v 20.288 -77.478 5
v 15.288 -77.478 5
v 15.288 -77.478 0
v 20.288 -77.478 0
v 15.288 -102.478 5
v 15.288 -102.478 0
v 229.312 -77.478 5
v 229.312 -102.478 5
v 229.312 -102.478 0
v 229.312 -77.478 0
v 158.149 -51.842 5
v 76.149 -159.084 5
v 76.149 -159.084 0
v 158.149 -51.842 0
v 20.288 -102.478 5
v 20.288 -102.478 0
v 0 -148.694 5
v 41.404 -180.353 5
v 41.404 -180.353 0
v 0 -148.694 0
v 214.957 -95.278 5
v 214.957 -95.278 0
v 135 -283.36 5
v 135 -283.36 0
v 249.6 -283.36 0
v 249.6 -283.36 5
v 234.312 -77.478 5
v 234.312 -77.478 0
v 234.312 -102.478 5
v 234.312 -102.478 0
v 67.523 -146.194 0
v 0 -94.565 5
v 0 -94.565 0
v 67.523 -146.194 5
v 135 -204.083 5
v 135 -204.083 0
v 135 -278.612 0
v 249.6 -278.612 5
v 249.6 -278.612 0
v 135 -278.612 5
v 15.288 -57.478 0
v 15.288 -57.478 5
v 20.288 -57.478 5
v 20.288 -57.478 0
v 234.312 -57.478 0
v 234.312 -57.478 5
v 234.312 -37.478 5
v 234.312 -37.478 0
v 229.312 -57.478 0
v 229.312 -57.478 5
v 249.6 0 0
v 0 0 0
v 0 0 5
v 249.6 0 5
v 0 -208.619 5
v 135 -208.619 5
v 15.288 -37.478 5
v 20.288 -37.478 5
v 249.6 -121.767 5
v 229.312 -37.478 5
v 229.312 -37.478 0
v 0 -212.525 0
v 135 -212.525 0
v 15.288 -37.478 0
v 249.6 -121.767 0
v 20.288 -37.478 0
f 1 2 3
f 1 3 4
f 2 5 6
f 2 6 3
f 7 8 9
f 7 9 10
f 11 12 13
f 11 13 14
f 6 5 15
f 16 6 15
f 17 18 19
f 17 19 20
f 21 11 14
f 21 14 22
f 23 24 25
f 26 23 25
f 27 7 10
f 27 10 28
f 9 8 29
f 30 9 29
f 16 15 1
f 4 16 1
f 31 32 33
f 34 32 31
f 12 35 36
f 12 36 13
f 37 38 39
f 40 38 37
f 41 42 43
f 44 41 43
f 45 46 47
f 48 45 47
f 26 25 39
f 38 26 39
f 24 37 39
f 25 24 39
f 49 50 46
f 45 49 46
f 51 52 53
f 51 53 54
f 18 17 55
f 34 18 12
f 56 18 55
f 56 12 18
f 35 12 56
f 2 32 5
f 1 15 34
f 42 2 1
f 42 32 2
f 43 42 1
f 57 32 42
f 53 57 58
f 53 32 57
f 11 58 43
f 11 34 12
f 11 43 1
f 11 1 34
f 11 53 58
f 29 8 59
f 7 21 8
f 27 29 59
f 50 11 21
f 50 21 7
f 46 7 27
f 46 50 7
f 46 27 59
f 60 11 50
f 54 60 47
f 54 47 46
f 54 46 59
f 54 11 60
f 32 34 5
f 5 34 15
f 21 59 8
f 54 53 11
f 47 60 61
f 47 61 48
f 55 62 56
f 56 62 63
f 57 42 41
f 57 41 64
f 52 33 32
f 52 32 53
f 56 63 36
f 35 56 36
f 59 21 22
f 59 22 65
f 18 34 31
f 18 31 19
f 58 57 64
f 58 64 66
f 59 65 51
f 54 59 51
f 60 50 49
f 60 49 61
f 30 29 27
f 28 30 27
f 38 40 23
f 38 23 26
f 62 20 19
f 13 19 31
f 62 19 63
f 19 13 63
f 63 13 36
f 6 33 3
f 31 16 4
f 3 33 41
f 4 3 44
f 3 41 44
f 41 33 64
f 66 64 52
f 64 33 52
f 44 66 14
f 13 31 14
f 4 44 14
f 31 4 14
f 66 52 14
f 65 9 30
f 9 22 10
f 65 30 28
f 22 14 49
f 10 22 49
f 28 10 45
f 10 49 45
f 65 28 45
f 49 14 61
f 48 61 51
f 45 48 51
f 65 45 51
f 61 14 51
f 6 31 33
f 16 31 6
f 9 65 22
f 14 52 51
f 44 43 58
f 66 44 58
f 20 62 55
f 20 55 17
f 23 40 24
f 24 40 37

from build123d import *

# Parameters (mm, degrees)
SKETCH1_W           = 249.6
SKETCH1_H           = 283.36
BOSS_EXTRUDE1_DEPTH = 5
SKETCH3_W           = 135
SKETCH3_H           = 230.014345446
CUT_EXTRUDE1_DEPTH  = 193
CUT_EXTRUDE2_DEPTH  = 6
CUT_EXTRUDE3_DEPTH  = 6
SKETCH6_R           = 2.1
SKETCH6_R_2         = 4
CUT_EXTRUDE4_DEPTH  = 6
SKETCH7_W           = 5
SKETCH7_H           = 20
SKETCH7_H_2         = 25
CUT_EXTRUDE5_DEPTH  = 6


with BuildPart() as part:
    # Sketch1 → Boss-Extrude1 (new body)
    with BuildSketch(Plane.XY):
        with Locations((124.8, -141.68)):
            Rectangle(SKETCH1_W, SKETCH1_H)
    extrude(amount=BOSS_EXTRUDE1_DEPTH)

    # Sketch3 → Cut-Extrude1 (cut)
    with BuildSketch(Plane(origin=(0, -131.96972983, 103.10605305), x_dir=(1, 0, 0), z_dir=(0, 0.788010754, -0.615661475))):
        with Locations((67.5, 103.601456608)):
            Rectangle(SKETCH3_W, SKETCH3_H)
    extrude(amount=-CUT_EXTRUDE1_DEPTH, mode=Mode.SUBTRACT)

    # Sketch4 → Cut-Extrude2 (cut, through all)
    with BuildSketch(Plane.XY.offset(5)):
        Polygon((214.957001473, -95.278291976), (249.6, -121.767183305), (249.6, -278.612119258), (135, -278.612119258), (135, -204.083134422), (76.149175745, -159.084342324), (158.149444505, -51.841832454), align=None)
    extrude(amount=-CUT_EXTRUDE2_DEPTH, mode=Mode.SUBTRACT)

    # Sketch5 → Cut-Extrude3 (cut, through all)
    with BuildSketch(Plane.XY.offset(5)):
        Polygon((0, -94.564658056), (67.52306177, -146.194456905), (41.404457646, -180.353182271), (-26.118604124, -128.723383422), align=None)
    extrude(amount=-CUT_EXTRUDE3_DEPTH, mode=Mode.SUBTRACT)

    # Sketch6 → Cut-Extrude4 (cut, through all)
    with BuildSketch(Plane.XY.offset(5)):
        with Locations((763.495728001, -447.322738807)):
            Circle(SKETCH6_R)
        with Locations((787.807112022, -441.495509021)):
            Circle(SKETCH6_R)
        with Locations((793.634341808, -465.806893042)):
            Circle(SKETCH6_R)
        with Locations((769.322957787, -471.634122828)):
            Circle(SKETCH6_R)
        with Locations((797.713402658, -482.824861857)):
            Circle(SKETCH6_R)
        with Locations((773.402018637, -488.652091643)):
            Circle(SKETCH6_R)
        with Locations((784.392264691, -480.876199946)):
            Circle(SKETCH6_R_2)
        with Locations((778.565034905, -456.564815925)):
            Circle(SKETCH6_R_2)
    extrude(amount=-CUT_EXTRUDE4_DEPTH, mode=Mode.SUBTRACT)

    # Sketch7 → Cut-Extrude5 (cut, through all)
    with BuildSketch(Plane.XY.offset(5)):
        with Locations((17.788155616, -47.477871486)):
            Rectangle(SKETCH7_W, SKETCH7_H)
        with Locations((231.811844384, -47.477871486)):
            Rectangle(SKETCH7_W, SKETCH7_H)
        with Locations((17.788155616, -89.977871486)):
            Rectangle(SKETCH7_W, SKETCH7_H_2)
        with Locations((231.811844384, -89.977871486)):
            Rectangle(SKETCH7_W, SKETCH7_H_2)
    extrude(amount=-CUT_EXTRUDE5_DEPTH, mode=Mode.SUBTRACT)


solid = part.part
